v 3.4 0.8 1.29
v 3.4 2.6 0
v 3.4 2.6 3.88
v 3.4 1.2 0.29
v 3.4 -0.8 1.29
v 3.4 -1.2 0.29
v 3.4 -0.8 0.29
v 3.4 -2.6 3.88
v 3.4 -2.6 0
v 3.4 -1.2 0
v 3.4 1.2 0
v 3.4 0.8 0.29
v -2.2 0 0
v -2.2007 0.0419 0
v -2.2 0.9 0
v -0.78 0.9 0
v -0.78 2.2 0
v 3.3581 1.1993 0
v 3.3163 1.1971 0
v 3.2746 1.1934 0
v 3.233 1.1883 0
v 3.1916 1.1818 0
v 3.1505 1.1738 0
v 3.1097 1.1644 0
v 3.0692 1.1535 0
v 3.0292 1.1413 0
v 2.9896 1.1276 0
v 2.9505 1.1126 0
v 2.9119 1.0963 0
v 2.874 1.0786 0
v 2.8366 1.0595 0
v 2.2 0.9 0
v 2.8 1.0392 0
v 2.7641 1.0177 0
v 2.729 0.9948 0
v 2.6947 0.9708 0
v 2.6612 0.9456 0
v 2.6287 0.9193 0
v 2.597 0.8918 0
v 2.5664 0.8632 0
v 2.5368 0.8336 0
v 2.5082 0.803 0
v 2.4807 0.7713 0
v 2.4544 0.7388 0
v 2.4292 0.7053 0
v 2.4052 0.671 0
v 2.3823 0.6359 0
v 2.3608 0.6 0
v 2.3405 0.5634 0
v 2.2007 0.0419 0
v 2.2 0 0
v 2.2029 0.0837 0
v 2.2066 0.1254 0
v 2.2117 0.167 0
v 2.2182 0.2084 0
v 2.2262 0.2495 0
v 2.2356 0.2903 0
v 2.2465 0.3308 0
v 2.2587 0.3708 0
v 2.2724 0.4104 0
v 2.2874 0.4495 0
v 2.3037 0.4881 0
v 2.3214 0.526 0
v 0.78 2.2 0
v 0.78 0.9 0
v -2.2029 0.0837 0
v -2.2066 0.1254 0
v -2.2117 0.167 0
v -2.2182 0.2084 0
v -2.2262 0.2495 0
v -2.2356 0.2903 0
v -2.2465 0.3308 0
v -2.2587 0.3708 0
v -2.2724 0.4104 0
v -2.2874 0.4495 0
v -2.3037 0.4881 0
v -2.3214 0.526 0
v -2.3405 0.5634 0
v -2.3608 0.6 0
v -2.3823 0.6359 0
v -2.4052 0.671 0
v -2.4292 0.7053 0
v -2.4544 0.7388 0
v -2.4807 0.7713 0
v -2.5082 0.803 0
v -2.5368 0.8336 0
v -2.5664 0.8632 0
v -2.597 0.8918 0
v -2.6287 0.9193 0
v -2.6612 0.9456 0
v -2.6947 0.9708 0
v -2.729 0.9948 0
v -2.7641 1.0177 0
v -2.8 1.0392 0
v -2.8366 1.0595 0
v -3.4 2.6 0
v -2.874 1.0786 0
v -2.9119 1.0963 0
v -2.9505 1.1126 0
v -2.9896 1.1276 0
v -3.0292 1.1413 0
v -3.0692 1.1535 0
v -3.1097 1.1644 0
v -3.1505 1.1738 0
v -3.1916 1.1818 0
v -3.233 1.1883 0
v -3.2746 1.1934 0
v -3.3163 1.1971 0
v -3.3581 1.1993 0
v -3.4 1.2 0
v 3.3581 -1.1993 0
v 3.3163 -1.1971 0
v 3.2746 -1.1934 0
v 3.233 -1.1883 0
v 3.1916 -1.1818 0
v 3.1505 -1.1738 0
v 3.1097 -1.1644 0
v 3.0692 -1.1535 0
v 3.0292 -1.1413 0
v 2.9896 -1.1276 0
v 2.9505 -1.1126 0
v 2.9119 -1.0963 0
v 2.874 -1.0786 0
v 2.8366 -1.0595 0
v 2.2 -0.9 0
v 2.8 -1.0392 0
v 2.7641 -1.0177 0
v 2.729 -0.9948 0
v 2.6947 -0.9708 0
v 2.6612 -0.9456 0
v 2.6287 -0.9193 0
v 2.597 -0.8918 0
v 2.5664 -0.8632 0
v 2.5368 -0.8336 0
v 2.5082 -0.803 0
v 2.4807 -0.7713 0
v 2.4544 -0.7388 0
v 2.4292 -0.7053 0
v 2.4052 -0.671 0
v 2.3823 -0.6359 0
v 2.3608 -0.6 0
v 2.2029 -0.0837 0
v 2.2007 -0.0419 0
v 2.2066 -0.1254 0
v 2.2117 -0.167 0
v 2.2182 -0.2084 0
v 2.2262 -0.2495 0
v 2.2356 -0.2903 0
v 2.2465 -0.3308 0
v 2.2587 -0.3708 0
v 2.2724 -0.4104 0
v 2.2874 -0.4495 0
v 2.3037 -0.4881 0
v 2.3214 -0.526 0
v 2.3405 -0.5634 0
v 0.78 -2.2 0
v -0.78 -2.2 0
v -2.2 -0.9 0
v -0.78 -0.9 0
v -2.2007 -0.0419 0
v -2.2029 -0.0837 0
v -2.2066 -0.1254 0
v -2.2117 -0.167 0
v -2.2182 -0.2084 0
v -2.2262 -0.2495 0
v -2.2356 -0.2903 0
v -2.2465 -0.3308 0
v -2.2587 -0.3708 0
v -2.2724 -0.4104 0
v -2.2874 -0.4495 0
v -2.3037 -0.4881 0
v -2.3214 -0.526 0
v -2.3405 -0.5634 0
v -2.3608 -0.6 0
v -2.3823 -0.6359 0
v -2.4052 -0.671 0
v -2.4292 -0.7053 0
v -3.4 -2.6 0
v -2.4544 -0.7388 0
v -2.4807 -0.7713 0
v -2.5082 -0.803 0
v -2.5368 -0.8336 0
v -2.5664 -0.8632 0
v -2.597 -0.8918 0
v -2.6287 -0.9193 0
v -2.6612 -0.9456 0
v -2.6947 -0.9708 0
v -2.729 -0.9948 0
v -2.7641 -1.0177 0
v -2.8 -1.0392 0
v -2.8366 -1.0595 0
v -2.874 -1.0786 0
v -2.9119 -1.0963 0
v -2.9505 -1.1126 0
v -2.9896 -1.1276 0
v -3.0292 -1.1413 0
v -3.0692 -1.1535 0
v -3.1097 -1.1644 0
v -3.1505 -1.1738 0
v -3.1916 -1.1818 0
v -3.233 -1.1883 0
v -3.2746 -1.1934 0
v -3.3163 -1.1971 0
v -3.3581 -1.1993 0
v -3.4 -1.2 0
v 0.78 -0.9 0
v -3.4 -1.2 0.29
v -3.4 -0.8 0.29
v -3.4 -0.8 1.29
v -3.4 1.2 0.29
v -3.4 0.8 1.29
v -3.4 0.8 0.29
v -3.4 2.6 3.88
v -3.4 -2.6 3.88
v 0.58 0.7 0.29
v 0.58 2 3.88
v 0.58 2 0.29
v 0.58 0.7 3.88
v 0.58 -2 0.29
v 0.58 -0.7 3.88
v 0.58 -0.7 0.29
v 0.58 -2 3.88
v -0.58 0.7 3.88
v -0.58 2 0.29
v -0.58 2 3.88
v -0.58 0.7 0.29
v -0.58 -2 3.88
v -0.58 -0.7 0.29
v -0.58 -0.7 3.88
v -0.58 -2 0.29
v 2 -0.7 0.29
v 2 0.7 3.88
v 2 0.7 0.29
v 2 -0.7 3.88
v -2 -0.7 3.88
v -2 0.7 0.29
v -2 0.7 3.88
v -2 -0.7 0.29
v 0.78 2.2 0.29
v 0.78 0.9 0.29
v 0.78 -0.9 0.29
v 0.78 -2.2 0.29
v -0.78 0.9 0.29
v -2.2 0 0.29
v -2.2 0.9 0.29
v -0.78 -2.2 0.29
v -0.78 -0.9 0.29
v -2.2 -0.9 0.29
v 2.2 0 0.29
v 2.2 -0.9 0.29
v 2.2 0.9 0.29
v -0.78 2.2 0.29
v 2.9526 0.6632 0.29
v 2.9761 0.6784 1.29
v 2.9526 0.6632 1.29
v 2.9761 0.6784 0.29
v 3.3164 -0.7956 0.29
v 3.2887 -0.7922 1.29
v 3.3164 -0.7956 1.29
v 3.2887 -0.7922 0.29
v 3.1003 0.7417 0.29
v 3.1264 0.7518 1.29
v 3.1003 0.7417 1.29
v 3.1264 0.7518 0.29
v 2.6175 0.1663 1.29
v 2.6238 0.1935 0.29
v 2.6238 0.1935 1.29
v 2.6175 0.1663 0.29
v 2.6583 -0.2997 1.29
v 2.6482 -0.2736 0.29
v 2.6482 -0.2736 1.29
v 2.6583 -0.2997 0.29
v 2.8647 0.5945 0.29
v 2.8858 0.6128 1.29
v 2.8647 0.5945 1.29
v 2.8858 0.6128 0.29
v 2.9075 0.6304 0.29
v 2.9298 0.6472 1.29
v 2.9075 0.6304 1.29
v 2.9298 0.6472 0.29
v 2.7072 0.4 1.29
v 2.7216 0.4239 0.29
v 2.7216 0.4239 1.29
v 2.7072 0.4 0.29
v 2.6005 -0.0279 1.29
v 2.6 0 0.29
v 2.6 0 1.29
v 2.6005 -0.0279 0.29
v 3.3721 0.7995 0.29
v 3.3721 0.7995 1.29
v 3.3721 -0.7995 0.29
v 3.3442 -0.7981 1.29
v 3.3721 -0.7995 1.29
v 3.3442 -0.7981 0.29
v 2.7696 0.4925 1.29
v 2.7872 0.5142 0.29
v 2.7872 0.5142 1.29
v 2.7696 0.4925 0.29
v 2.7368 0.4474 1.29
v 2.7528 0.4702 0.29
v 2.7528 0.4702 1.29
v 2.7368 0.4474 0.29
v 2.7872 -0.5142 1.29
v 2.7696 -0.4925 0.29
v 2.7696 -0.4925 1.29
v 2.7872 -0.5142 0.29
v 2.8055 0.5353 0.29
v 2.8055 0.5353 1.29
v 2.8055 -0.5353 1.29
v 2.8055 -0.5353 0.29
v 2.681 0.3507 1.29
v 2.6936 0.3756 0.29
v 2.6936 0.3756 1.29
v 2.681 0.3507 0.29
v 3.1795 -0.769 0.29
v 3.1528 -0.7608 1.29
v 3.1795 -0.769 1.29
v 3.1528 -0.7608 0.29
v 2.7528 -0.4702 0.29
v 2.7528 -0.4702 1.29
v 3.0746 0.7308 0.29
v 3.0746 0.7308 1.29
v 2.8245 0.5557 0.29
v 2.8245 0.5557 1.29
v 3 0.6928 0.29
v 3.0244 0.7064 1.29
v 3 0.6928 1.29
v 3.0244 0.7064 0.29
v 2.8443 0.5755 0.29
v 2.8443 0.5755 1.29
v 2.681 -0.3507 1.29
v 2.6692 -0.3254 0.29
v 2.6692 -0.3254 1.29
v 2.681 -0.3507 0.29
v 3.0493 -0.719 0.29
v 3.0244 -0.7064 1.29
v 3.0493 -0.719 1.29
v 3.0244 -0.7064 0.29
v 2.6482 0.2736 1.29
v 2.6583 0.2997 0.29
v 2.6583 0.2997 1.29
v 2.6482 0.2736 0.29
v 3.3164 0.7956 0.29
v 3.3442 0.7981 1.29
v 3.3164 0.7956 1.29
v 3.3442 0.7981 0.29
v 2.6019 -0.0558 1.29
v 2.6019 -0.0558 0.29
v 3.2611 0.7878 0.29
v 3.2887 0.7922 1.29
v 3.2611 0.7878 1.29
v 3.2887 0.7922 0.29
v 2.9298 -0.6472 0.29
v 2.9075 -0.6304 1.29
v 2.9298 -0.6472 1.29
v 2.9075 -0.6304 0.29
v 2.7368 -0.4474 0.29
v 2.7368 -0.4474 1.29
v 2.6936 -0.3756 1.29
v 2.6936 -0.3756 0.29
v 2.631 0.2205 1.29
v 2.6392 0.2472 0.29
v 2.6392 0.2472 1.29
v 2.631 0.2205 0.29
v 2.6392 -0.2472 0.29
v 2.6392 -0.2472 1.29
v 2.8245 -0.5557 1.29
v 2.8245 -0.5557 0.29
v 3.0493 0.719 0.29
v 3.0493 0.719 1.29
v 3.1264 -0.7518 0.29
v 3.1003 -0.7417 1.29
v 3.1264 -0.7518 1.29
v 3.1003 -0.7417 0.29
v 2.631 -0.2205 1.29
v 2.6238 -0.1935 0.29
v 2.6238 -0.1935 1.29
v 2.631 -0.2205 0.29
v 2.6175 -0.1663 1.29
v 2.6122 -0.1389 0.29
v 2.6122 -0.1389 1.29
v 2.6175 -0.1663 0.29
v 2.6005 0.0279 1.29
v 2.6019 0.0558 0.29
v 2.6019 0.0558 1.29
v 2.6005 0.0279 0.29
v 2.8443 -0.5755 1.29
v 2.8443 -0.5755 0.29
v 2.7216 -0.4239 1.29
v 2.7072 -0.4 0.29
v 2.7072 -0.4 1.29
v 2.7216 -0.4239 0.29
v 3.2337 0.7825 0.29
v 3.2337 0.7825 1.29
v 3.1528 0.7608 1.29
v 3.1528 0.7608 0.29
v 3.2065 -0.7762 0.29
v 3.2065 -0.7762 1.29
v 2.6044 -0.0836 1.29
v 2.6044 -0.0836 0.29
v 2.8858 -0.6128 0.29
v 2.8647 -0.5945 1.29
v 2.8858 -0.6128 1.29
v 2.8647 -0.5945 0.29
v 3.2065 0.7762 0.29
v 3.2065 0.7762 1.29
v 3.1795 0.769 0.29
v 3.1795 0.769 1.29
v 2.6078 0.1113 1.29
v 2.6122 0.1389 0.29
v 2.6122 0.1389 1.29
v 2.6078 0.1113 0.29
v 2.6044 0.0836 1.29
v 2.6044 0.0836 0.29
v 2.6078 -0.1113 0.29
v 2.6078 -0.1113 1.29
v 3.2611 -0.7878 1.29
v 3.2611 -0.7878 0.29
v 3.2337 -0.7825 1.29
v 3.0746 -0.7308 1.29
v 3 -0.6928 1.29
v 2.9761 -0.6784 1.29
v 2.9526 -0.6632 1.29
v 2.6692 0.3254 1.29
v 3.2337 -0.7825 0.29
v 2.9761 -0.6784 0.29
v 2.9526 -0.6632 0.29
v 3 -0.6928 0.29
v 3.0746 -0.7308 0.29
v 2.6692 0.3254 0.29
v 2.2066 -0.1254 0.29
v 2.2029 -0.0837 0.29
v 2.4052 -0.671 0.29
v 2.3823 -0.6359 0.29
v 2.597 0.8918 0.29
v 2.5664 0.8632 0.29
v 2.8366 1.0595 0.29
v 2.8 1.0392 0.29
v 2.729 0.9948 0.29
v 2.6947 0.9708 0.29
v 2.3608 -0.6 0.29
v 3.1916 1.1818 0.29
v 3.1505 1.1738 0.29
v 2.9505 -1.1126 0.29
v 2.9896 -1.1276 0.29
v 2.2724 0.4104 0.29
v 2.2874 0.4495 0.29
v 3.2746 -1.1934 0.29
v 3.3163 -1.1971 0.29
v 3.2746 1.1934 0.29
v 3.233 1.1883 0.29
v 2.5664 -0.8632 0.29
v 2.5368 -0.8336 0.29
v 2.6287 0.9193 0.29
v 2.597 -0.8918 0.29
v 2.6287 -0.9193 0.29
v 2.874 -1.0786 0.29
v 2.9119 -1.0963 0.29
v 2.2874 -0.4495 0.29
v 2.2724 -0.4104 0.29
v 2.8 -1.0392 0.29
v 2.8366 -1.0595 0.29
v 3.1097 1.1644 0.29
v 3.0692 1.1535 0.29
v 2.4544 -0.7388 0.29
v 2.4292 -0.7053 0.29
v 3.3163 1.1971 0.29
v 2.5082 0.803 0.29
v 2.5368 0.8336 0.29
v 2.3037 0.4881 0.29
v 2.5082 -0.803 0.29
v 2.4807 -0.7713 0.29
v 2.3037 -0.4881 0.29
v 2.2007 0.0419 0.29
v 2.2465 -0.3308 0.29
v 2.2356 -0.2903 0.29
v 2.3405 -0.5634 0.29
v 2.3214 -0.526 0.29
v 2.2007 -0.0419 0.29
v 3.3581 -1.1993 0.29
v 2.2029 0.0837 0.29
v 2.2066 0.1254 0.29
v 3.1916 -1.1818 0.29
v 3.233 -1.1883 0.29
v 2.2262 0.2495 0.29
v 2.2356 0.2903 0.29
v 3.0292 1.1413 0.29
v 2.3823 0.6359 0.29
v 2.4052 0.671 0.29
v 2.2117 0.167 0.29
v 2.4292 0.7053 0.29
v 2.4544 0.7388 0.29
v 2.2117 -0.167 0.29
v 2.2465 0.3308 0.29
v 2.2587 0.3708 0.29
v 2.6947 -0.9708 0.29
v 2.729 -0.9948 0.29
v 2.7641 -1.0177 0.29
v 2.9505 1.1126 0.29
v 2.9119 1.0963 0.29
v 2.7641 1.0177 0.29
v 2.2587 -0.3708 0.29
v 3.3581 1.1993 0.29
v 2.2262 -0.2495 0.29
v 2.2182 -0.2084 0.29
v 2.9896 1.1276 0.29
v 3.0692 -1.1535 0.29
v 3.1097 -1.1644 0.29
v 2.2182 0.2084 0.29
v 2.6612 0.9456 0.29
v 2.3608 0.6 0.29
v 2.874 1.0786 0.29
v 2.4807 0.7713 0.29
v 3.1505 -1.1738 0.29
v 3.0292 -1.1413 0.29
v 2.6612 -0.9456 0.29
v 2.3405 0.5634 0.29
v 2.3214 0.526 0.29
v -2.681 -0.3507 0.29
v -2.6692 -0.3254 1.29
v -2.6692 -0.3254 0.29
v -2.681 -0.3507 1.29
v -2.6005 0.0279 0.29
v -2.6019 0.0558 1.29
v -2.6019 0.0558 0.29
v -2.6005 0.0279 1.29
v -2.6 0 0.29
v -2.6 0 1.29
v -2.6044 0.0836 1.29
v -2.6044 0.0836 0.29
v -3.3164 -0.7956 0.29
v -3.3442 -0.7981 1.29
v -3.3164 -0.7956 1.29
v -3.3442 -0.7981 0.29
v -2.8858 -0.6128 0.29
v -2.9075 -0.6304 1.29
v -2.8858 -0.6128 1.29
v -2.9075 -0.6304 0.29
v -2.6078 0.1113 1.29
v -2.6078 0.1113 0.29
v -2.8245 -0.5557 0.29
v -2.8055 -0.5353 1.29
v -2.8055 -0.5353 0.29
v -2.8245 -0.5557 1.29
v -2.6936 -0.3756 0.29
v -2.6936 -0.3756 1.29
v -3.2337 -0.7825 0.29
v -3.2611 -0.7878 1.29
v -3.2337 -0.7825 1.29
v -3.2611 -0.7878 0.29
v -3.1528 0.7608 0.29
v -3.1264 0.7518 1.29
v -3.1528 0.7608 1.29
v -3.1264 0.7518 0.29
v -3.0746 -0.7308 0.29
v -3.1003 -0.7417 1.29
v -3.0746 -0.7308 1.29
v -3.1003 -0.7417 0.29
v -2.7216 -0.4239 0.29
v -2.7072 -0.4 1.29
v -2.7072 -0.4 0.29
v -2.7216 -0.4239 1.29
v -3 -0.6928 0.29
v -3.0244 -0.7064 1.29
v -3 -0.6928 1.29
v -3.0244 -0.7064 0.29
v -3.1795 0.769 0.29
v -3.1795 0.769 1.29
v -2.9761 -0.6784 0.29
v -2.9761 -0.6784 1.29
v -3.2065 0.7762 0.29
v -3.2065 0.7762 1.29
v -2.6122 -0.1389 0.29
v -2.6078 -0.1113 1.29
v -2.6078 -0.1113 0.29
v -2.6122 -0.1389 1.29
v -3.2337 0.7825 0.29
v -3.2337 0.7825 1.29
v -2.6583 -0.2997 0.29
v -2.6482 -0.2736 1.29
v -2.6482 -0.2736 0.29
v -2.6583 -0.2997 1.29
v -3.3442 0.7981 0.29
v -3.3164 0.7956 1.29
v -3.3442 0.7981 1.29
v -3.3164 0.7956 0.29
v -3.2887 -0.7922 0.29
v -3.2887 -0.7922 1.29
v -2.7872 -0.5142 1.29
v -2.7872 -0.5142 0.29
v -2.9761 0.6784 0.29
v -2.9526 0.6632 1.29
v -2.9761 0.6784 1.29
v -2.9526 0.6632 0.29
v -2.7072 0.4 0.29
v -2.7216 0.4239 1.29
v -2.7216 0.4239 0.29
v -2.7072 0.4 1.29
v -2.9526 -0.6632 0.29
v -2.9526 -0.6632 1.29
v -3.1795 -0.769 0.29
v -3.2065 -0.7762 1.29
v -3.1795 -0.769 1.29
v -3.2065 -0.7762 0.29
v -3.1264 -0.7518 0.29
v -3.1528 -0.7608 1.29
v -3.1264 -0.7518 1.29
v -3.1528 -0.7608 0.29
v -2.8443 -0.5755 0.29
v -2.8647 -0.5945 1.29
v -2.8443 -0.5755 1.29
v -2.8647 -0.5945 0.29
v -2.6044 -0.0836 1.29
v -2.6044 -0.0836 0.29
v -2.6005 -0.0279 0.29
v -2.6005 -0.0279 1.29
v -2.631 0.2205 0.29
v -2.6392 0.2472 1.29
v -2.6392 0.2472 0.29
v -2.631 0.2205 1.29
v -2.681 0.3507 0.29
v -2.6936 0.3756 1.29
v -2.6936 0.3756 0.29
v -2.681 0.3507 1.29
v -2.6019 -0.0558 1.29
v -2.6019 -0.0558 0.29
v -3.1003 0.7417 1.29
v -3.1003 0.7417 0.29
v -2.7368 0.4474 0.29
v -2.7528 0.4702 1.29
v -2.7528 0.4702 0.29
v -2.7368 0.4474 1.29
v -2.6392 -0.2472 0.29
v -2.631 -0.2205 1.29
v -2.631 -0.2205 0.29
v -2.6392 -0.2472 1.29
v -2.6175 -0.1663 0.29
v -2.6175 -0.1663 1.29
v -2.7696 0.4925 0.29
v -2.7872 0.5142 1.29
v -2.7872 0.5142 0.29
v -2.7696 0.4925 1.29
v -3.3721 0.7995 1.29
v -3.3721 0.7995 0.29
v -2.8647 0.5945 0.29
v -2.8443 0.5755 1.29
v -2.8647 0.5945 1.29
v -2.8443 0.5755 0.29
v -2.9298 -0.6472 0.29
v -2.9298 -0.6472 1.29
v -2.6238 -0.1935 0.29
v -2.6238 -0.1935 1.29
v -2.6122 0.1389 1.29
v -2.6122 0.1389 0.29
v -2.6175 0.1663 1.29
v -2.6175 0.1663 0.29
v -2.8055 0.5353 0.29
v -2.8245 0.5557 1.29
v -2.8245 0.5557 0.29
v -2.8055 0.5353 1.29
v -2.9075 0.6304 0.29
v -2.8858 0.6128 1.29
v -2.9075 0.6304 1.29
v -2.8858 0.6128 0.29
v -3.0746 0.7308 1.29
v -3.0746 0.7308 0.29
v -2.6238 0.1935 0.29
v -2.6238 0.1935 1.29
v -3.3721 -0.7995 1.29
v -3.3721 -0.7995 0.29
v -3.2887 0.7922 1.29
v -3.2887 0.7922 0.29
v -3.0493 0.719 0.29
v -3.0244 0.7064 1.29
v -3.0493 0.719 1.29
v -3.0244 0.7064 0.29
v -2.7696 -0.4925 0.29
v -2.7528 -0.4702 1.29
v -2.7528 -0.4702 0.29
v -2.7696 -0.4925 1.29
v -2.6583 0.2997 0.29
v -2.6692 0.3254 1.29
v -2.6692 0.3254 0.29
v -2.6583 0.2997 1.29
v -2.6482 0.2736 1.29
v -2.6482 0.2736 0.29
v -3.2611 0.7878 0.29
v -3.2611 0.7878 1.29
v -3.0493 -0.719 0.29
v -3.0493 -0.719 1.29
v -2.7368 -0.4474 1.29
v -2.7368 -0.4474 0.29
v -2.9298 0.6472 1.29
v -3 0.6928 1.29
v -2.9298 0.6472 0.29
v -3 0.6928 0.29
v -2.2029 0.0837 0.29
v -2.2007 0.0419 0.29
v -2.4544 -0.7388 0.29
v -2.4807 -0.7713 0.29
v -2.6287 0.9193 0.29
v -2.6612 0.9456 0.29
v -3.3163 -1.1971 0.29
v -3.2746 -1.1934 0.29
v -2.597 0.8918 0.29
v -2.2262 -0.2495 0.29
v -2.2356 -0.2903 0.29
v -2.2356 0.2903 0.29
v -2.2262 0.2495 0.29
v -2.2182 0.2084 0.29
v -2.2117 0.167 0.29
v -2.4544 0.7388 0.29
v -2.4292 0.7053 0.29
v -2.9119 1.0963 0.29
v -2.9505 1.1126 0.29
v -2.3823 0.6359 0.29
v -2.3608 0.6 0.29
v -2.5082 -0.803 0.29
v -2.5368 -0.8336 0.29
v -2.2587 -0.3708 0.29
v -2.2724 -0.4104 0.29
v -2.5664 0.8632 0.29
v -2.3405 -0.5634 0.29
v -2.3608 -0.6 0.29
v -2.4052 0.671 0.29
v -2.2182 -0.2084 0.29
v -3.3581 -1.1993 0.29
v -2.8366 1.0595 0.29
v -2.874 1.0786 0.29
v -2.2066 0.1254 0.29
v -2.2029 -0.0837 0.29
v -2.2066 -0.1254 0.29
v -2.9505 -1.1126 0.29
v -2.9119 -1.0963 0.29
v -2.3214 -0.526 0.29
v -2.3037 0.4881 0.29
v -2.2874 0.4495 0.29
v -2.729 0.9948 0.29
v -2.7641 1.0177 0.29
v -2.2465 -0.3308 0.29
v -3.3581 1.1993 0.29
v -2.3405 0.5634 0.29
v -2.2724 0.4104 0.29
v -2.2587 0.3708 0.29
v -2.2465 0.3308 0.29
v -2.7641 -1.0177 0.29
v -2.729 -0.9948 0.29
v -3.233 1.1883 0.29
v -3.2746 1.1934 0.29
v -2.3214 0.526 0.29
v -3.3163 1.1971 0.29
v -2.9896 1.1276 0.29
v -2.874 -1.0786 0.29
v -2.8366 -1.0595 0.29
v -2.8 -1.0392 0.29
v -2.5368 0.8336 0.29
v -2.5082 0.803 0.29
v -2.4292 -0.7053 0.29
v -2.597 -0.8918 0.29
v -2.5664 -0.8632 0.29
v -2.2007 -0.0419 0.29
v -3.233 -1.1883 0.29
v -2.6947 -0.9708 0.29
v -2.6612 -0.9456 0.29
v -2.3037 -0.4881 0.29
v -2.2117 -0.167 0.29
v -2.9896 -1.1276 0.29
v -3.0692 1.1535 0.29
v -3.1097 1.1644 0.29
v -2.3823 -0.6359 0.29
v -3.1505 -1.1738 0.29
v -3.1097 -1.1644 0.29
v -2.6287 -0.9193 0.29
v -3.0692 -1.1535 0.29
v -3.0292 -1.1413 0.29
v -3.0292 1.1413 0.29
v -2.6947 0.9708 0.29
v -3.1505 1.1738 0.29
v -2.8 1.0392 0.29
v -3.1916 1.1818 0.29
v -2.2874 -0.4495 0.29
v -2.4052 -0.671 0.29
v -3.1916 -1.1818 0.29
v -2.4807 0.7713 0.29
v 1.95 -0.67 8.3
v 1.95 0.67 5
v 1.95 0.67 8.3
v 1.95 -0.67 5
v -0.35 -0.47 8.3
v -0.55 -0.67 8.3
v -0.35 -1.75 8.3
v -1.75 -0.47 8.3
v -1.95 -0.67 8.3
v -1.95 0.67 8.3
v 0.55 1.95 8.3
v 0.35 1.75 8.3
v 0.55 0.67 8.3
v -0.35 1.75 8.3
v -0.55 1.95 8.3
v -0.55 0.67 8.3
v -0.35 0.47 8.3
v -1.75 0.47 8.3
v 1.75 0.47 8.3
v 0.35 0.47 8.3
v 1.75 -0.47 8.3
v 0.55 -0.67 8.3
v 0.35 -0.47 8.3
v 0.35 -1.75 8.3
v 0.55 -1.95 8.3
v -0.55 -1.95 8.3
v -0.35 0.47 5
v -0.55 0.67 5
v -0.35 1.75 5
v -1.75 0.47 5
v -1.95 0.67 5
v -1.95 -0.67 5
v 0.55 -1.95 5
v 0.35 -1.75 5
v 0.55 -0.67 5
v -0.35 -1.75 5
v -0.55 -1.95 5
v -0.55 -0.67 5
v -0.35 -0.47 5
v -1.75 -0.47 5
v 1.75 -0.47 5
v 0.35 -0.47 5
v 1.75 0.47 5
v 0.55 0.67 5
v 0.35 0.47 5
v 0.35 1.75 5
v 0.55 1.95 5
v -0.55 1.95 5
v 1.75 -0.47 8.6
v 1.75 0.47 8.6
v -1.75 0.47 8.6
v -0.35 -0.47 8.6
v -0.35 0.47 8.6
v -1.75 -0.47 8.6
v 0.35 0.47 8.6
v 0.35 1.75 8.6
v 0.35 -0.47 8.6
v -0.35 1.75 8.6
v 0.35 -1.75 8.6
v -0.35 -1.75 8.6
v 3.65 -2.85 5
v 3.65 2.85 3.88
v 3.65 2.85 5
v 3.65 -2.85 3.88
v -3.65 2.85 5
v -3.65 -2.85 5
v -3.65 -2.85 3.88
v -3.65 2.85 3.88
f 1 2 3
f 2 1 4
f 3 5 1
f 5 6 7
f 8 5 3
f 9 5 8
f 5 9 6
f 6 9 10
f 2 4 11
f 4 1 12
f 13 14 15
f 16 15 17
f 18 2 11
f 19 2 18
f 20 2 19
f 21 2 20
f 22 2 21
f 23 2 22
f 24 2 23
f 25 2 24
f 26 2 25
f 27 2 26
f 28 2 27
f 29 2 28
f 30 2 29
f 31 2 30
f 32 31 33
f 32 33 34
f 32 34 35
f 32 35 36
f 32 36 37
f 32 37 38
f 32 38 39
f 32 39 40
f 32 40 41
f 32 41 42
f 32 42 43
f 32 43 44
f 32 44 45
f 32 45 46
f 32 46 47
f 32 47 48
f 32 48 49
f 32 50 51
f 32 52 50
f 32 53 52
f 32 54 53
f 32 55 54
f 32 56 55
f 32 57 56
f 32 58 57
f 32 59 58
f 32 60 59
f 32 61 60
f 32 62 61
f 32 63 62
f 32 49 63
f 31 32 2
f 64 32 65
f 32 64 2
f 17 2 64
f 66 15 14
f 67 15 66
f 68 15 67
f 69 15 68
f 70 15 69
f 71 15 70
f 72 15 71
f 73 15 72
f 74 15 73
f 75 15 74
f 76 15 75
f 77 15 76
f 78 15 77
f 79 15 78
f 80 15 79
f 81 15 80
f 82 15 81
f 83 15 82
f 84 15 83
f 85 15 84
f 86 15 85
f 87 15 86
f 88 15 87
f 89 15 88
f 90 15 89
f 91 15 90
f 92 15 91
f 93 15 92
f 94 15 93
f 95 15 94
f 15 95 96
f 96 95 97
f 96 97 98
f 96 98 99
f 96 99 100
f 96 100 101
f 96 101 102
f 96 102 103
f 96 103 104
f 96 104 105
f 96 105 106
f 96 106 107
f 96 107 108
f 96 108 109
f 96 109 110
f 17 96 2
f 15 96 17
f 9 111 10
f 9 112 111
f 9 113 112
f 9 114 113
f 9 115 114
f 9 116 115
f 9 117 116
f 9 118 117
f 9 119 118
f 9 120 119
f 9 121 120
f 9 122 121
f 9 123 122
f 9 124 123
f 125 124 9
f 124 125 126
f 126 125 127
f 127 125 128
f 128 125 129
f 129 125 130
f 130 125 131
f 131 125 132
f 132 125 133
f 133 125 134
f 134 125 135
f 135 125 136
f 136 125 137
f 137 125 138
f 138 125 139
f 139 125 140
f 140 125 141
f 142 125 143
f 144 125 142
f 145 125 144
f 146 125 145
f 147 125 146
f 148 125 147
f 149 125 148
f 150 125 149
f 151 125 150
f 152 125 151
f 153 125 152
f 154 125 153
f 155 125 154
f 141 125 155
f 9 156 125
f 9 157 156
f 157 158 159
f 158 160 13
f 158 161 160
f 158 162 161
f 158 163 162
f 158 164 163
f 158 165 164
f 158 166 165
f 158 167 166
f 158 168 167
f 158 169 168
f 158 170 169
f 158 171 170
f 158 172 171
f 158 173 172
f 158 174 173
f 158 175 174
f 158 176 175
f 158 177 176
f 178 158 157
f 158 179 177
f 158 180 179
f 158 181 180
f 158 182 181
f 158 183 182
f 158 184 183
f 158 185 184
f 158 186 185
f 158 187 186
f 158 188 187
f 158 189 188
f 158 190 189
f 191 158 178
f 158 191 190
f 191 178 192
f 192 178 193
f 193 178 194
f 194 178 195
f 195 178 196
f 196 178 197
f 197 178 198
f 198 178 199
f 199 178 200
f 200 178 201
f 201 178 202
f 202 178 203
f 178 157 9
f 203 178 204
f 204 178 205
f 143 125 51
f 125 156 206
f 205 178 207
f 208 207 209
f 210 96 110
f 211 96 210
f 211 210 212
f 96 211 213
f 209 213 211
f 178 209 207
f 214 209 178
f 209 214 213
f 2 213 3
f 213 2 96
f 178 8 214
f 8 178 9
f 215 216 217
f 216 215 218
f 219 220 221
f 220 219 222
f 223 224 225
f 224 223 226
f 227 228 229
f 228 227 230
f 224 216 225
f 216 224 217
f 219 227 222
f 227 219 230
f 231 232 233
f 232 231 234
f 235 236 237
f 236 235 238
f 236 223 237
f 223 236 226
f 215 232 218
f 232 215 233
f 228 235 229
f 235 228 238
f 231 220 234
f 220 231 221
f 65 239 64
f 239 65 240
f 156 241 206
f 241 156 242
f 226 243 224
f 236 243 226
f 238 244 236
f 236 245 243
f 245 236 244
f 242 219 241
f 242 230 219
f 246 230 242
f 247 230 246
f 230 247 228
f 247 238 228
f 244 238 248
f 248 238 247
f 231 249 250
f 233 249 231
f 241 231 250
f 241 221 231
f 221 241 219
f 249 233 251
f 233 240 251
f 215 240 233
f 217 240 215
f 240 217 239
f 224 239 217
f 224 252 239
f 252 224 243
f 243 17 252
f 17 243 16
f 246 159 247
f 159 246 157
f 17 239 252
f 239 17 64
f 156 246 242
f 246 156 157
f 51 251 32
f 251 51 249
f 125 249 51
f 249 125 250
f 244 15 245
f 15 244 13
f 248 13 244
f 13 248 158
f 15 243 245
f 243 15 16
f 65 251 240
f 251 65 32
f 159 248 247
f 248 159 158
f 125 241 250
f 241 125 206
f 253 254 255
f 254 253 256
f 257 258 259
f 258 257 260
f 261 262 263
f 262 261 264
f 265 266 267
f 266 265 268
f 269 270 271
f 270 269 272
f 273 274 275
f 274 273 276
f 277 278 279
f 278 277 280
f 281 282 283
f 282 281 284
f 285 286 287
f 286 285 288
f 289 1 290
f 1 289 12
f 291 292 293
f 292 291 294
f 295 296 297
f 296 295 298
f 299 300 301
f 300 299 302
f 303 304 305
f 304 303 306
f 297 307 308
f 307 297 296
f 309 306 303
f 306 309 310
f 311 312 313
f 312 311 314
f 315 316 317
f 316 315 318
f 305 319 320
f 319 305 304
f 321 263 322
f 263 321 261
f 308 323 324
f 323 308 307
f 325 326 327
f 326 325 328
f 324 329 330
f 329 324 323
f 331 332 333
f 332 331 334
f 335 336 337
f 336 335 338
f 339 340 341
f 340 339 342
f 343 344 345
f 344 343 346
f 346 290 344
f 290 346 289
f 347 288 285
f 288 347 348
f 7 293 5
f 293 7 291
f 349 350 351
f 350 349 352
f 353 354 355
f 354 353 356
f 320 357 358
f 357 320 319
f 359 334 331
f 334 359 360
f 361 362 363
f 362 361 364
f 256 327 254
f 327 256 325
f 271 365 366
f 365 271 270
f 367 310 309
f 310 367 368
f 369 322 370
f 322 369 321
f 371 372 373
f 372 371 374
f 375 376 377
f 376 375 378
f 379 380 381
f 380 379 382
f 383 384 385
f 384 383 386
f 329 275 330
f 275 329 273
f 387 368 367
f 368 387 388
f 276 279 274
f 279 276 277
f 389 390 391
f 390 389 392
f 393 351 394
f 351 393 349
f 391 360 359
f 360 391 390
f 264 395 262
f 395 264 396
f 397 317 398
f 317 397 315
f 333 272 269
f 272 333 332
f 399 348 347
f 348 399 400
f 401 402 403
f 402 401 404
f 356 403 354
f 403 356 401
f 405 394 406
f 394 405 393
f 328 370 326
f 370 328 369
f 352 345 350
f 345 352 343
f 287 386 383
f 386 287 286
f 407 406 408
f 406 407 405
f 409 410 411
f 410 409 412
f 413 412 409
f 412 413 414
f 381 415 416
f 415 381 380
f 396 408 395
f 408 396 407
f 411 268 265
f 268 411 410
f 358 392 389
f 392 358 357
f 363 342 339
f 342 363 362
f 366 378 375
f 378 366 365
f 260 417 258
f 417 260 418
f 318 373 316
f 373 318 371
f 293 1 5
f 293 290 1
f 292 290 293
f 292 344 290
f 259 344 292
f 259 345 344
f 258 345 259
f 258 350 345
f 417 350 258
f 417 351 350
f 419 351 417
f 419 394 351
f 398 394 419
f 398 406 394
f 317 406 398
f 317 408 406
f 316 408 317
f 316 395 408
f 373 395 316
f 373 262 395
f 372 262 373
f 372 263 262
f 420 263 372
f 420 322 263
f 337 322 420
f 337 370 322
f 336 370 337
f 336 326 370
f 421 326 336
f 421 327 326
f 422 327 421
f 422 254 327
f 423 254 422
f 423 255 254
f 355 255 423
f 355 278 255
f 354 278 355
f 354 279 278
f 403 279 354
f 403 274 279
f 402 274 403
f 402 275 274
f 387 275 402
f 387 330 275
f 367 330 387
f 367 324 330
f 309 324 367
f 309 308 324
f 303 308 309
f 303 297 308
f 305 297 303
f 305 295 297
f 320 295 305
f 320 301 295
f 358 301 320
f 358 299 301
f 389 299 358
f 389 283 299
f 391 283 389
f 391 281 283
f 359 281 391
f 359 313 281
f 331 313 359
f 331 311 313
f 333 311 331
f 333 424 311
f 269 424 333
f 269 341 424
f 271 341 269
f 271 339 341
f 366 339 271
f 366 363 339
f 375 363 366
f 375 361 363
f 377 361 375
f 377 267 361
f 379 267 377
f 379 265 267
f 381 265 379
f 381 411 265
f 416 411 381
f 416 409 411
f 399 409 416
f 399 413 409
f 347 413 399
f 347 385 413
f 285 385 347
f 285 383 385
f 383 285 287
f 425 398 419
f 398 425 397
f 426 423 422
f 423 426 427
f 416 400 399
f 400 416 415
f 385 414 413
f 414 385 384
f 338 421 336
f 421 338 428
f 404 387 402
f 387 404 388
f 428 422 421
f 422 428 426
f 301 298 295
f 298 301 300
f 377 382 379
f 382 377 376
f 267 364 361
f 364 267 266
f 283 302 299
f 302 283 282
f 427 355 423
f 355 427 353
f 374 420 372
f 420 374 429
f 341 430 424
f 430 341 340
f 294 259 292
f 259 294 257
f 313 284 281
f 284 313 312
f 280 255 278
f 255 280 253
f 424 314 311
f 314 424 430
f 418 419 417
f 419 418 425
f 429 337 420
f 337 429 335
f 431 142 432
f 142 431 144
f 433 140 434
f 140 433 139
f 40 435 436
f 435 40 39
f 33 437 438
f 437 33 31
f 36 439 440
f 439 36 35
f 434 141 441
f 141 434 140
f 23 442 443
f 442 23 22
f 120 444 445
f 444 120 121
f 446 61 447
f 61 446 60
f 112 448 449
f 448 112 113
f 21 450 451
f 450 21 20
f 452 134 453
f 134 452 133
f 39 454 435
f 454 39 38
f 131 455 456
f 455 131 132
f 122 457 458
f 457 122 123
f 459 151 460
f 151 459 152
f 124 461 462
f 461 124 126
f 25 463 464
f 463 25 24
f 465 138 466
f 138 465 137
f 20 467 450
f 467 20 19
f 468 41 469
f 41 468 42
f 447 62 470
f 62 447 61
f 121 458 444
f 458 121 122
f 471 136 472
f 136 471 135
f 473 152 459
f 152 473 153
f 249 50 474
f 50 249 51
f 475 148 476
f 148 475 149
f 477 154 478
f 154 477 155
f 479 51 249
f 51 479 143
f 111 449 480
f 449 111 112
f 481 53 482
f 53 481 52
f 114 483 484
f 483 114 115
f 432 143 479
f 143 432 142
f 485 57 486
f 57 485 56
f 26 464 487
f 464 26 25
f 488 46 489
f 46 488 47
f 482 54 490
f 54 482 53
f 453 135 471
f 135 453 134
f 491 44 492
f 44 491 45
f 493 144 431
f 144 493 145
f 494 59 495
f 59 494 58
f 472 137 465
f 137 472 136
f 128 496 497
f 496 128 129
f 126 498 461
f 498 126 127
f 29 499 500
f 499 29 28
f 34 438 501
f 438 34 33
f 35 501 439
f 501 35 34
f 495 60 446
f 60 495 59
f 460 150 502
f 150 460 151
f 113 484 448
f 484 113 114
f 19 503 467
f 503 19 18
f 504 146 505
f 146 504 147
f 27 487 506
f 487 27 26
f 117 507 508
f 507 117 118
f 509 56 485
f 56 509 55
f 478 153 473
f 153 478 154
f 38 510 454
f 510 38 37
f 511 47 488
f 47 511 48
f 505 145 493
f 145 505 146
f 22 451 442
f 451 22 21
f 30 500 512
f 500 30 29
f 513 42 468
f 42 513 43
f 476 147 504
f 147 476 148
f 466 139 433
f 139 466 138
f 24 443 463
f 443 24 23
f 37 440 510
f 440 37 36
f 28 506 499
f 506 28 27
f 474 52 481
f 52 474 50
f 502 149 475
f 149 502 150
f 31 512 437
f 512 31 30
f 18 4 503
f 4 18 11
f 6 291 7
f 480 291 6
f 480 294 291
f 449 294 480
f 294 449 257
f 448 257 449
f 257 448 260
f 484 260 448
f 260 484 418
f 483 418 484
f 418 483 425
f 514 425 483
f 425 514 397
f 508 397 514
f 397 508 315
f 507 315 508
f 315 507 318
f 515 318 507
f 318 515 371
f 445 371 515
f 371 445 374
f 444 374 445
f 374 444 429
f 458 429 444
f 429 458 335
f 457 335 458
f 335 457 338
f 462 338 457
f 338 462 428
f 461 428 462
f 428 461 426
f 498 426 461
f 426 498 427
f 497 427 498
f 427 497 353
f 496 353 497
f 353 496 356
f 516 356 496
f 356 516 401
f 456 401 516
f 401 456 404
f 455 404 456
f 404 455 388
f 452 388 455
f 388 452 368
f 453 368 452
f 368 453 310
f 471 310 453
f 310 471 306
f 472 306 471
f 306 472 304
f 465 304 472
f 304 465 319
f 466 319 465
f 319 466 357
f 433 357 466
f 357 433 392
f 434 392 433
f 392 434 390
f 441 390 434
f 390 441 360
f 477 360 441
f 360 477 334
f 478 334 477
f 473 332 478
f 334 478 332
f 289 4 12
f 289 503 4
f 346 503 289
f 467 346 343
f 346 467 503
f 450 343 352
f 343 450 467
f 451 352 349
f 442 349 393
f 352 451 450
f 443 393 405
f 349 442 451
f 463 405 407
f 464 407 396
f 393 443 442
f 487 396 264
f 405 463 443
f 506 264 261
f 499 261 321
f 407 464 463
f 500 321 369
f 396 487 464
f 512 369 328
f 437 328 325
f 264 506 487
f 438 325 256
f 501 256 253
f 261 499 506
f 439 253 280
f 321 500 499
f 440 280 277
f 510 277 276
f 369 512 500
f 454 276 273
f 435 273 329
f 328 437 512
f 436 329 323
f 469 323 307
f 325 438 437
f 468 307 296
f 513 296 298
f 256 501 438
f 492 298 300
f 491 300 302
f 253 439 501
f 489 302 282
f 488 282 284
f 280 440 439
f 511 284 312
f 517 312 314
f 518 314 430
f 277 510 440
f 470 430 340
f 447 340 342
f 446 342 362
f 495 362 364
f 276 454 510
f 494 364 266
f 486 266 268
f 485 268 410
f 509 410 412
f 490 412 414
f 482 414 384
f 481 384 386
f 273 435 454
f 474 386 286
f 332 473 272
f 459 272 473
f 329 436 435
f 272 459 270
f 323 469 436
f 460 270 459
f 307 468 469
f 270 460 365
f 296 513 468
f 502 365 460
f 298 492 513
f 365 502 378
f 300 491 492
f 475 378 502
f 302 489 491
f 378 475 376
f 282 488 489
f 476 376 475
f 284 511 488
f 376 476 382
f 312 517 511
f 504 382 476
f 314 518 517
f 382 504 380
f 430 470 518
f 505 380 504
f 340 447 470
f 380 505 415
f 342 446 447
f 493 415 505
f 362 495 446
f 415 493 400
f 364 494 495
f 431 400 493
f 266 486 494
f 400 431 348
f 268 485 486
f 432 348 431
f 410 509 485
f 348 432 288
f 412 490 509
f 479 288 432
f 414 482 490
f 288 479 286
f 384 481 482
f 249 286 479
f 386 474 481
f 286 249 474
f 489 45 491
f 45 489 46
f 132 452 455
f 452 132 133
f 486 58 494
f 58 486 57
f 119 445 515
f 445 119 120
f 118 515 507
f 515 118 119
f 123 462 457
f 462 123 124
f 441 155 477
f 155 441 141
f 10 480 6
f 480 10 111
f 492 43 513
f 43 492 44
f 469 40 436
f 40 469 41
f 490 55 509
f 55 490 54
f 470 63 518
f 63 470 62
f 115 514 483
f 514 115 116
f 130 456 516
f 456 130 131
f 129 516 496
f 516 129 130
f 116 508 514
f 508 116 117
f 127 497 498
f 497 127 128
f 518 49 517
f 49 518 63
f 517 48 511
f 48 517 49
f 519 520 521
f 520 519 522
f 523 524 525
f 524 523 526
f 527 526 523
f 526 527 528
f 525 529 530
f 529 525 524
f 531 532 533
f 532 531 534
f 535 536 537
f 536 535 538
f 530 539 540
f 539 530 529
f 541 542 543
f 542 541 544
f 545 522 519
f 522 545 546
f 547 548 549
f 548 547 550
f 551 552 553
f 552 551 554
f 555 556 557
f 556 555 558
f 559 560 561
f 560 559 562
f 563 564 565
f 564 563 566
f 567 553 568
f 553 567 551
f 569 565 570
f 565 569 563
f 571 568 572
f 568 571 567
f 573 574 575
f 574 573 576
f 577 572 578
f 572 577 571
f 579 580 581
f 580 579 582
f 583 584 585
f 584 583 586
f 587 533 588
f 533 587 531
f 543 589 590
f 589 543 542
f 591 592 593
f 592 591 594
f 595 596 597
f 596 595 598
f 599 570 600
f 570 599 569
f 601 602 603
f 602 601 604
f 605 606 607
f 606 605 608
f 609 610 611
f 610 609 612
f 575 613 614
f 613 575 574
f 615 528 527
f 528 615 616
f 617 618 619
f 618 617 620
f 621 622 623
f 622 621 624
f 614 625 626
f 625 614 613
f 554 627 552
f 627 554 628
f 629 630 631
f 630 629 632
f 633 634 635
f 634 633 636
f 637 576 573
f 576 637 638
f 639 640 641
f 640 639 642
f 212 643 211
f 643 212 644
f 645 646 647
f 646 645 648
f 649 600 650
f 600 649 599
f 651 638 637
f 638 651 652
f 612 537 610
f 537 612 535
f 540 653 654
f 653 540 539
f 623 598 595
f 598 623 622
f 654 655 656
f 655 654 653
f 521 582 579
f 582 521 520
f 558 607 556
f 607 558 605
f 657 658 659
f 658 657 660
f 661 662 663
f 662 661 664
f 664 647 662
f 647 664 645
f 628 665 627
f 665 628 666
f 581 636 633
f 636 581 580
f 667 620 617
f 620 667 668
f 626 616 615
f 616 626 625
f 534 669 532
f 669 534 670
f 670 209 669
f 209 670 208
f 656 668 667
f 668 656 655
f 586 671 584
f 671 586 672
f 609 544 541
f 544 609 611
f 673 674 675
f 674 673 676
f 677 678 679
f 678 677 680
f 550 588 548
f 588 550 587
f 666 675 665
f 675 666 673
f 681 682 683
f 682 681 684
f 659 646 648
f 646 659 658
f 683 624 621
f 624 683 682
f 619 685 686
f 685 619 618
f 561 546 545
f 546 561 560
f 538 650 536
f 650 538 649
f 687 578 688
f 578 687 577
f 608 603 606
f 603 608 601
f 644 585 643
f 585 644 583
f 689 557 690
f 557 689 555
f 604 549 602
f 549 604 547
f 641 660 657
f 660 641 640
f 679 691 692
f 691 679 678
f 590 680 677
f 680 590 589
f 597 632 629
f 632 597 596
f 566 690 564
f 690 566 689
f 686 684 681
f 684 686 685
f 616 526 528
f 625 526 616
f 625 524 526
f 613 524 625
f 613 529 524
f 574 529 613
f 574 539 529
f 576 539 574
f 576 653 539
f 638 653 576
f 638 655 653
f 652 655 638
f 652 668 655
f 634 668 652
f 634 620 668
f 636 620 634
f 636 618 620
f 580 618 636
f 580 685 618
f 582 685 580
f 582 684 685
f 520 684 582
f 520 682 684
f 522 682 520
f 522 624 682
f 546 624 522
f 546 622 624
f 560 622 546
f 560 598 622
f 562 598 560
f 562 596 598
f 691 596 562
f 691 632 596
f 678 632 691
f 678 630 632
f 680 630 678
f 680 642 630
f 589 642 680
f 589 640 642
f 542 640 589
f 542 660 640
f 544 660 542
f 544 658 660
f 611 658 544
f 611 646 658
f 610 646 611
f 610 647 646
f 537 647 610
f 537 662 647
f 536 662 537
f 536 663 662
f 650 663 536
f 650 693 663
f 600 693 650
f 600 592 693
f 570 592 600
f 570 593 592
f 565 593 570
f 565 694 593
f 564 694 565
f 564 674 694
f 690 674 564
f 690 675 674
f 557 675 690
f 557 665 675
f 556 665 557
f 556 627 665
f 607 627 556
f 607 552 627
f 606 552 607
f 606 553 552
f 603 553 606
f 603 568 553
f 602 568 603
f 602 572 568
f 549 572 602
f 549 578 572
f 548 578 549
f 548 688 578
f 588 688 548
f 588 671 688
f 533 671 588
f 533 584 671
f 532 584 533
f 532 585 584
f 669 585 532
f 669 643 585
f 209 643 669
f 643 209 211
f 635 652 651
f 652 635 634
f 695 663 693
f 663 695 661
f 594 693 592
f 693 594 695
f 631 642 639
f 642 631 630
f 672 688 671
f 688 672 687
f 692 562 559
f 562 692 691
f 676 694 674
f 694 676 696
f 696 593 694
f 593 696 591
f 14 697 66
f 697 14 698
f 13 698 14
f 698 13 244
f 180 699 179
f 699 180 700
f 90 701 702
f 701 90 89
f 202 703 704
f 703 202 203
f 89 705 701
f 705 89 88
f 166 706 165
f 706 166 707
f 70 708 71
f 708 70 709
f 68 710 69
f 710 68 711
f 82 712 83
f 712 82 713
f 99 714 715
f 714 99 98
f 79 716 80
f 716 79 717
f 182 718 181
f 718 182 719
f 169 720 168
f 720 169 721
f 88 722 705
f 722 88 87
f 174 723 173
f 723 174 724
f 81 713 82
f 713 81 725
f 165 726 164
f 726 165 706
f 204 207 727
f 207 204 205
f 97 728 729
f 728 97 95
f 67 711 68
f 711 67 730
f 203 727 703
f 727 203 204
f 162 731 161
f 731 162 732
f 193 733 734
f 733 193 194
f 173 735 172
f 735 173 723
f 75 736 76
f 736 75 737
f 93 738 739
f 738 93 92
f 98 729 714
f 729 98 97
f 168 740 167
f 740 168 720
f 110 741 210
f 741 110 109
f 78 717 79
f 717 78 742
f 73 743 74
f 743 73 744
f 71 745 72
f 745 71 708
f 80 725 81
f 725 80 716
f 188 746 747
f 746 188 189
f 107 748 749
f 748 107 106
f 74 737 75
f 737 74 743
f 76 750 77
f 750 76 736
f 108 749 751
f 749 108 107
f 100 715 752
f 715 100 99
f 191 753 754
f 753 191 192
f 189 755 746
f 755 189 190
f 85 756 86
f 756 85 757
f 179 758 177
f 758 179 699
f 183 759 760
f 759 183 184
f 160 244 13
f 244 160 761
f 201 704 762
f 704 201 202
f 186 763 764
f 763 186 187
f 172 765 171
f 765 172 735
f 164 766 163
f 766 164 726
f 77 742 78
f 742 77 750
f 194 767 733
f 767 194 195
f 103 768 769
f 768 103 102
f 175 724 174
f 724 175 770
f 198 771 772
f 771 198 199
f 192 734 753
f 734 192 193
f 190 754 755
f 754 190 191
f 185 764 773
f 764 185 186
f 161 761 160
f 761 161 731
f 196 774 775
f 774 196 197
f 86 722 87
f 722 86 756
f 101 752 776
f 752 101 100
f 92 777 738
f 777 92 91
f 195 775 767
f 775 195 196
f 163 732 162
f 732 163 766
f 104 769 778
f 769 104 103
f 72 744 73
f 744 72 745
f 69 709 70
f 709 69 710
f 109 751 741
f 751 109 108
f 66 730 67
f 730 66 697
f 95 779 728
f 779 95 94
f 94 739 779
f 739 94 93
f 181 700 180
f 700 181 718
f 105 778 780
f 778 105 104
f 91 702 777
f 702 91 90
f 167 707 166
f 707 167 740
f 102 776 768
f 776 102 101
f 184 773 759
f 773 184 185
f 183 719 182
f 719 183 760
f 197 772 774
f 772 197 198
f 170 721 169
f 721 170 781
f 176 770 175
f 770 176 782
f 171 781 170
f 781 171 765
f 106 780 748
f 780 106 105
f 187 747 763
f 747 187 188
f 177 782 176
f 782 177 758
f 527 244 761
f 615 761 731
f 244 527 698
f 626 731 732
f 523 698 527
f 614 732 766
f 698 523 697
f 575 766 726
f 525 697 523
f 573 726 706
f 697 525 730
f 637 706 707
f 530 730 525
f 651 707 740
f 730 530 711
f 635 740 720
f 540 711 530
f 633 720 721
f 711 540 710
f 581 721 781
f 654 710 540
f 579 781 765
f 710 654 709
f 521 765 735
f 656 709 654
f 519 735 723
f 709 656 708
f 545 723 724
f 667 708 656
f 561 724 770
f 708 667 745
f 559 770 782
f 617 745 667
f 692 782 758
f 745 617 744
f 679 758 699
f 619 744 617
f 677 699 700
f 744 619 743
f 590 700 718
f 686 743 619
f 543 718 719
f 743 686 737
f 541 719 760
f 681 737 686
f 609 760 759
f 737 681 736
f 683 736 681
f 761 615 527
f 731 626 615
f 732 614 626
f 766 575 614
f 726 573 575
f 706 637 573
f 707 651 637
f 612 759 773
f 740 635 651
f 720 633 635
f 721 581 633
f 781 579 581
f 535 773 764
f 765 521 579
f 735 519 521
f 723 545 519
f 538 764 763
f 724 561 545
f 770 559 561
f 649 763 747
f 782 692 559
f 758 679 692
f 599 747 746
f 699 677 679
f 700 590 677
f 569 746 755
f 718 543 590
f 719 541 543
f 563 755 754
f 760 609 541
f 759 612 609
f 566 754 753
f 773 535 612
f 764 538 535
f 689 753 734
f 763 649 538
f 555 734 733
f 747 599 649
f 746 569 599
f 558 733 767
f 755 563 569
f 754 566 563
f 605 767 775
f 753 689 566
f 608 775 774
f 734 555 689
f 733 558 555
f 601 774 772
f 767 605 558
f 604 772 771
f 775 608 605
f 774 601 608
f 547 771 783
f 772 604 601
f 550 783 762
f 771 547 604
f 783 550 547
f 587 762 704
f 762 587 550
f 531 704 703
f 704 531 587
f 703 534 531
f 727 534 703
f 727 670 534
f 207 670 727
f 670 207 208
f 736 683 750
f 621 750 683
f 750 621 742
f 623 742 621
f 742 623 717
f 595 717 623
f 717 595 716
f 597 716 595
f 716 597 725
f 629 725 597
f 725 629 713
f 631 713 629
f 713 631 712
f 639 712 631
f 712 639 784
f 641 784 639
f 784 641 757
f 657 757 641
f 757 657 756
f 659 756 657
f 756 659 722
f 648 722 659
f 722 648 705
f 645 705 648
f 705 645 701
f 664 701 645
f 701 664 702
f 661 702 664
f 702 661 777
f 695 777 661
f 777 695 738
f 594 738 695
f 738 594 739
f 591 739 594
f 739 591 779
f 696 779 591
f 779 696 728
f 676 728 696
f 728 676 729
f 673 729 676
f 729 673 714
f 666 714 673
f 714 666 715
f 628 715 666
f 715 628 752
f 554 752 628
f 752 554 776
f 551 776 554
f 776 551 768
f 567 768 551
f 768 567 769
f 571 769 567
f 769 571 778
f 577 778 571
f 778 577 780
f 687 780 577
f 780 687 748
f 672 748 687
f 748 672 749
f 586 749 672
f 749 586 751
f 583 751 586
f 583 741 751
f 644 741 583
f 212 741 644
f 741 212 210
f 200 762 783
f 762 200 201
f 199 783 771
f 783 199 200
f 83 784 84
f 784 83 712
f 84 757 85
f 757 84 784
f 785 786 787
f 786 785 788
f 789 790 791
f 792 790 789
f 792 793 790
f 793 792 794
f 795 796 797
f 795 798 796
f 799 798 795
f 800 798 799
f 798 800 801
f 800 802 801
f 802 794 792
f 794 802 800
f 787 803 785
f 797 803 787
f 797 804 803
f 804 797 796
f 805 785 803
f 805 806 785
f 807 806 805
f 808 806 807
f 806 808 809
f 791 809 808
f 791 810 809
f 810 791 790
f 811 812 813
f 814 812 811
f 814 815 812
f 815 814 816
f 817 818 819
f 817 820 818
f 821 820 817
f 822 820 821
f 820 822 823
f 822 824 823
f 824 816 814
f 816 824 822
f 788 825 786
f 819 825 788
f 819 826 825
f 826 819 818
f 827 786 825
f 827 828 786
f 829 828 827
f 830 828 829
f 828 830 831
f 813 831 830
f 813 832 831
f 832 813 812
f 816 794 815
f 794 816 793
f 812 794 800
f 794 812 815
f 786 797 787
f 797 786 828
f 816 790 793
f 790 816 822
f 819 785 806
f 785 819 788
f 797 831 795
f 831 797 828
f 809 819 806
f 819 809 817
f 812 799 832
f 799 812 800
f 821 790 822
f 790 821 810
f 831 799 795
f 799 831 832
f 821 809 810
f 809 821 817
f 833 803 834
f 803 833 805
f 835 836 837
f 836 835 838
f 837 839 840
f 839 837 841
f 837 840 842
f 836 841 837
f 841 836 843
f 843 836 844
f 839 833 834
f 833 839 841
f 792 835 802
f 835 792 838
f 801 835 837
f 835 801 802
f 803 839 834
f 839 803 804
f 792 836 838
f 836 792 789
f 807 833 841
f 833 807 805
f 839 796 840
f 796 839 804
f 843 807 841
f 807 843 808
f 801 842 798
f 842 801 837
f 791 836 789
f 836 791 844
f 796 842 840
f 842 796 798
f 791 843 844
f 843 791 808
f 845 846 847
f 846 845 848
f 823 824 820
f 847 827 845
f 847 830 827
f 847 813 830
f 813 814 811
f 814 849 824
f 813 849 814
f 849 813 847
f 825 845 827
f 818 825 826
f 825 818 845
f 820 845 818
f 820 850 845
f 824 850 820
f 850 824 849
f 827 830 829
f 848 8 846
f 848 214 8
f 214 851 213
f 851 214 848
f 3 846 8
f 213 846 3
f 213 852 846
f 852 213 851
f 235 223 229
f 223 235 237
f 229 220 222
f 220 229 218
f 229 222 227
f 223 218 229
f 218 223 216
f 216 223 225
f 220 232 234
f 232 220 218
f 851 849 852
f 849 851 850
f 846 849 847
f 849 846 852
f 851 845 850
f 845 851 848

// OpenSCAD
// file: cherry-female.scad
$fn=180;
eps=0.01;

// Params Cherry mate
cherry_thick1=1.16;
cherry_thick2=1.40;
cherry_wide=4.00;
cherry_high=3.90;
//shaft_high=5.00;
shaft_high=cherry_high+0.3;
shaft_wide=6.80;
shaft_deep=5.20;
fudge_high=0.30;
fudge_plus=0.40;

// Cherry mate
difference() {
    // base body
    translate([0, 0, shaft_high/2]) cube([shaft_wide, shaft_deep, shaft_high], center=true);
    // cherry splines
    translate([0, 0, cherry_high/2-eps]) 
        cube([cherry_thick1, cherry_wide, cherry_high], center=true); 
    translate([0, 0, cherry_high/2-eps]) 
        cube([cherry_wide, cherry_thick2, cherry_high], center=true); 
    // fudge bottom layer
    translate([0, 0, fudge_high/2-eps]) 
        cube([cherry_thick1+fudge_plus, cherry_wide+fudge_plus, fudge_high], center=true); 
    translate([0, 0, fudge_high/2-eps]) 
        cube([cherry_wide+fudge_plus, cherry_thick2+fudge_plus, fudge_high], center=true);
    
    
    // debug
    //translate([0, 0, -0.01]) cube(90);
}
// main file
$fn=180;
eps=0.01;

// Params Cherry post
c2_wide=3.90;
base_high=5.00;
spline_high=3.30;
spline_t1=1.10;
spline_t2=1.34;
f2_high=0.30;
f2_plus=0.40;

// Wide mating plate
wmp_wide=7.3;
wmp_deep=5.7;

// Cherry mate
difference() {
    // cherry base
    union() {
        include <cherry-female.scad>;
    }
    // registration nubs
    translate([3.4, 0, -eps]) cylinder(1.3, 0.8, 0.8);
    translate([3.4, 0, -eps]) cylinder(0.3, 1.2, 1.2);
    translate([-3.4, 0, -eps]) cylinder(1.3, 0.8, 0.8);
    translate([-3.4, 0, -eps]) cylinder(0.3, 1.2, 1.2);
}

// Base
//translate([0, 0, 3.88]) cylinder(base_high-3.88, 2.5, 2.5);
translate([-wmp_wide/2, -wmp_deep/2, 3.88]) cube([wmp_wide, wmp_deep, base_high-3.88]);

// Cherry post
translate([0, 0, base_high+spline_high/2]) {
    cube([c2_wide, spline_t2, spline_high], center=true);
    cube([spline_t1, c2_wide, spline_high], center=true);
    cube([c2_wide-f2_plus, spline_t2-f2_plus, spline_high+f2_high*2], center=true);
    cube([spline_t1-f2_plus, c2_wide-f2_plus, spline_high+f2_high*2], center=true);
}
